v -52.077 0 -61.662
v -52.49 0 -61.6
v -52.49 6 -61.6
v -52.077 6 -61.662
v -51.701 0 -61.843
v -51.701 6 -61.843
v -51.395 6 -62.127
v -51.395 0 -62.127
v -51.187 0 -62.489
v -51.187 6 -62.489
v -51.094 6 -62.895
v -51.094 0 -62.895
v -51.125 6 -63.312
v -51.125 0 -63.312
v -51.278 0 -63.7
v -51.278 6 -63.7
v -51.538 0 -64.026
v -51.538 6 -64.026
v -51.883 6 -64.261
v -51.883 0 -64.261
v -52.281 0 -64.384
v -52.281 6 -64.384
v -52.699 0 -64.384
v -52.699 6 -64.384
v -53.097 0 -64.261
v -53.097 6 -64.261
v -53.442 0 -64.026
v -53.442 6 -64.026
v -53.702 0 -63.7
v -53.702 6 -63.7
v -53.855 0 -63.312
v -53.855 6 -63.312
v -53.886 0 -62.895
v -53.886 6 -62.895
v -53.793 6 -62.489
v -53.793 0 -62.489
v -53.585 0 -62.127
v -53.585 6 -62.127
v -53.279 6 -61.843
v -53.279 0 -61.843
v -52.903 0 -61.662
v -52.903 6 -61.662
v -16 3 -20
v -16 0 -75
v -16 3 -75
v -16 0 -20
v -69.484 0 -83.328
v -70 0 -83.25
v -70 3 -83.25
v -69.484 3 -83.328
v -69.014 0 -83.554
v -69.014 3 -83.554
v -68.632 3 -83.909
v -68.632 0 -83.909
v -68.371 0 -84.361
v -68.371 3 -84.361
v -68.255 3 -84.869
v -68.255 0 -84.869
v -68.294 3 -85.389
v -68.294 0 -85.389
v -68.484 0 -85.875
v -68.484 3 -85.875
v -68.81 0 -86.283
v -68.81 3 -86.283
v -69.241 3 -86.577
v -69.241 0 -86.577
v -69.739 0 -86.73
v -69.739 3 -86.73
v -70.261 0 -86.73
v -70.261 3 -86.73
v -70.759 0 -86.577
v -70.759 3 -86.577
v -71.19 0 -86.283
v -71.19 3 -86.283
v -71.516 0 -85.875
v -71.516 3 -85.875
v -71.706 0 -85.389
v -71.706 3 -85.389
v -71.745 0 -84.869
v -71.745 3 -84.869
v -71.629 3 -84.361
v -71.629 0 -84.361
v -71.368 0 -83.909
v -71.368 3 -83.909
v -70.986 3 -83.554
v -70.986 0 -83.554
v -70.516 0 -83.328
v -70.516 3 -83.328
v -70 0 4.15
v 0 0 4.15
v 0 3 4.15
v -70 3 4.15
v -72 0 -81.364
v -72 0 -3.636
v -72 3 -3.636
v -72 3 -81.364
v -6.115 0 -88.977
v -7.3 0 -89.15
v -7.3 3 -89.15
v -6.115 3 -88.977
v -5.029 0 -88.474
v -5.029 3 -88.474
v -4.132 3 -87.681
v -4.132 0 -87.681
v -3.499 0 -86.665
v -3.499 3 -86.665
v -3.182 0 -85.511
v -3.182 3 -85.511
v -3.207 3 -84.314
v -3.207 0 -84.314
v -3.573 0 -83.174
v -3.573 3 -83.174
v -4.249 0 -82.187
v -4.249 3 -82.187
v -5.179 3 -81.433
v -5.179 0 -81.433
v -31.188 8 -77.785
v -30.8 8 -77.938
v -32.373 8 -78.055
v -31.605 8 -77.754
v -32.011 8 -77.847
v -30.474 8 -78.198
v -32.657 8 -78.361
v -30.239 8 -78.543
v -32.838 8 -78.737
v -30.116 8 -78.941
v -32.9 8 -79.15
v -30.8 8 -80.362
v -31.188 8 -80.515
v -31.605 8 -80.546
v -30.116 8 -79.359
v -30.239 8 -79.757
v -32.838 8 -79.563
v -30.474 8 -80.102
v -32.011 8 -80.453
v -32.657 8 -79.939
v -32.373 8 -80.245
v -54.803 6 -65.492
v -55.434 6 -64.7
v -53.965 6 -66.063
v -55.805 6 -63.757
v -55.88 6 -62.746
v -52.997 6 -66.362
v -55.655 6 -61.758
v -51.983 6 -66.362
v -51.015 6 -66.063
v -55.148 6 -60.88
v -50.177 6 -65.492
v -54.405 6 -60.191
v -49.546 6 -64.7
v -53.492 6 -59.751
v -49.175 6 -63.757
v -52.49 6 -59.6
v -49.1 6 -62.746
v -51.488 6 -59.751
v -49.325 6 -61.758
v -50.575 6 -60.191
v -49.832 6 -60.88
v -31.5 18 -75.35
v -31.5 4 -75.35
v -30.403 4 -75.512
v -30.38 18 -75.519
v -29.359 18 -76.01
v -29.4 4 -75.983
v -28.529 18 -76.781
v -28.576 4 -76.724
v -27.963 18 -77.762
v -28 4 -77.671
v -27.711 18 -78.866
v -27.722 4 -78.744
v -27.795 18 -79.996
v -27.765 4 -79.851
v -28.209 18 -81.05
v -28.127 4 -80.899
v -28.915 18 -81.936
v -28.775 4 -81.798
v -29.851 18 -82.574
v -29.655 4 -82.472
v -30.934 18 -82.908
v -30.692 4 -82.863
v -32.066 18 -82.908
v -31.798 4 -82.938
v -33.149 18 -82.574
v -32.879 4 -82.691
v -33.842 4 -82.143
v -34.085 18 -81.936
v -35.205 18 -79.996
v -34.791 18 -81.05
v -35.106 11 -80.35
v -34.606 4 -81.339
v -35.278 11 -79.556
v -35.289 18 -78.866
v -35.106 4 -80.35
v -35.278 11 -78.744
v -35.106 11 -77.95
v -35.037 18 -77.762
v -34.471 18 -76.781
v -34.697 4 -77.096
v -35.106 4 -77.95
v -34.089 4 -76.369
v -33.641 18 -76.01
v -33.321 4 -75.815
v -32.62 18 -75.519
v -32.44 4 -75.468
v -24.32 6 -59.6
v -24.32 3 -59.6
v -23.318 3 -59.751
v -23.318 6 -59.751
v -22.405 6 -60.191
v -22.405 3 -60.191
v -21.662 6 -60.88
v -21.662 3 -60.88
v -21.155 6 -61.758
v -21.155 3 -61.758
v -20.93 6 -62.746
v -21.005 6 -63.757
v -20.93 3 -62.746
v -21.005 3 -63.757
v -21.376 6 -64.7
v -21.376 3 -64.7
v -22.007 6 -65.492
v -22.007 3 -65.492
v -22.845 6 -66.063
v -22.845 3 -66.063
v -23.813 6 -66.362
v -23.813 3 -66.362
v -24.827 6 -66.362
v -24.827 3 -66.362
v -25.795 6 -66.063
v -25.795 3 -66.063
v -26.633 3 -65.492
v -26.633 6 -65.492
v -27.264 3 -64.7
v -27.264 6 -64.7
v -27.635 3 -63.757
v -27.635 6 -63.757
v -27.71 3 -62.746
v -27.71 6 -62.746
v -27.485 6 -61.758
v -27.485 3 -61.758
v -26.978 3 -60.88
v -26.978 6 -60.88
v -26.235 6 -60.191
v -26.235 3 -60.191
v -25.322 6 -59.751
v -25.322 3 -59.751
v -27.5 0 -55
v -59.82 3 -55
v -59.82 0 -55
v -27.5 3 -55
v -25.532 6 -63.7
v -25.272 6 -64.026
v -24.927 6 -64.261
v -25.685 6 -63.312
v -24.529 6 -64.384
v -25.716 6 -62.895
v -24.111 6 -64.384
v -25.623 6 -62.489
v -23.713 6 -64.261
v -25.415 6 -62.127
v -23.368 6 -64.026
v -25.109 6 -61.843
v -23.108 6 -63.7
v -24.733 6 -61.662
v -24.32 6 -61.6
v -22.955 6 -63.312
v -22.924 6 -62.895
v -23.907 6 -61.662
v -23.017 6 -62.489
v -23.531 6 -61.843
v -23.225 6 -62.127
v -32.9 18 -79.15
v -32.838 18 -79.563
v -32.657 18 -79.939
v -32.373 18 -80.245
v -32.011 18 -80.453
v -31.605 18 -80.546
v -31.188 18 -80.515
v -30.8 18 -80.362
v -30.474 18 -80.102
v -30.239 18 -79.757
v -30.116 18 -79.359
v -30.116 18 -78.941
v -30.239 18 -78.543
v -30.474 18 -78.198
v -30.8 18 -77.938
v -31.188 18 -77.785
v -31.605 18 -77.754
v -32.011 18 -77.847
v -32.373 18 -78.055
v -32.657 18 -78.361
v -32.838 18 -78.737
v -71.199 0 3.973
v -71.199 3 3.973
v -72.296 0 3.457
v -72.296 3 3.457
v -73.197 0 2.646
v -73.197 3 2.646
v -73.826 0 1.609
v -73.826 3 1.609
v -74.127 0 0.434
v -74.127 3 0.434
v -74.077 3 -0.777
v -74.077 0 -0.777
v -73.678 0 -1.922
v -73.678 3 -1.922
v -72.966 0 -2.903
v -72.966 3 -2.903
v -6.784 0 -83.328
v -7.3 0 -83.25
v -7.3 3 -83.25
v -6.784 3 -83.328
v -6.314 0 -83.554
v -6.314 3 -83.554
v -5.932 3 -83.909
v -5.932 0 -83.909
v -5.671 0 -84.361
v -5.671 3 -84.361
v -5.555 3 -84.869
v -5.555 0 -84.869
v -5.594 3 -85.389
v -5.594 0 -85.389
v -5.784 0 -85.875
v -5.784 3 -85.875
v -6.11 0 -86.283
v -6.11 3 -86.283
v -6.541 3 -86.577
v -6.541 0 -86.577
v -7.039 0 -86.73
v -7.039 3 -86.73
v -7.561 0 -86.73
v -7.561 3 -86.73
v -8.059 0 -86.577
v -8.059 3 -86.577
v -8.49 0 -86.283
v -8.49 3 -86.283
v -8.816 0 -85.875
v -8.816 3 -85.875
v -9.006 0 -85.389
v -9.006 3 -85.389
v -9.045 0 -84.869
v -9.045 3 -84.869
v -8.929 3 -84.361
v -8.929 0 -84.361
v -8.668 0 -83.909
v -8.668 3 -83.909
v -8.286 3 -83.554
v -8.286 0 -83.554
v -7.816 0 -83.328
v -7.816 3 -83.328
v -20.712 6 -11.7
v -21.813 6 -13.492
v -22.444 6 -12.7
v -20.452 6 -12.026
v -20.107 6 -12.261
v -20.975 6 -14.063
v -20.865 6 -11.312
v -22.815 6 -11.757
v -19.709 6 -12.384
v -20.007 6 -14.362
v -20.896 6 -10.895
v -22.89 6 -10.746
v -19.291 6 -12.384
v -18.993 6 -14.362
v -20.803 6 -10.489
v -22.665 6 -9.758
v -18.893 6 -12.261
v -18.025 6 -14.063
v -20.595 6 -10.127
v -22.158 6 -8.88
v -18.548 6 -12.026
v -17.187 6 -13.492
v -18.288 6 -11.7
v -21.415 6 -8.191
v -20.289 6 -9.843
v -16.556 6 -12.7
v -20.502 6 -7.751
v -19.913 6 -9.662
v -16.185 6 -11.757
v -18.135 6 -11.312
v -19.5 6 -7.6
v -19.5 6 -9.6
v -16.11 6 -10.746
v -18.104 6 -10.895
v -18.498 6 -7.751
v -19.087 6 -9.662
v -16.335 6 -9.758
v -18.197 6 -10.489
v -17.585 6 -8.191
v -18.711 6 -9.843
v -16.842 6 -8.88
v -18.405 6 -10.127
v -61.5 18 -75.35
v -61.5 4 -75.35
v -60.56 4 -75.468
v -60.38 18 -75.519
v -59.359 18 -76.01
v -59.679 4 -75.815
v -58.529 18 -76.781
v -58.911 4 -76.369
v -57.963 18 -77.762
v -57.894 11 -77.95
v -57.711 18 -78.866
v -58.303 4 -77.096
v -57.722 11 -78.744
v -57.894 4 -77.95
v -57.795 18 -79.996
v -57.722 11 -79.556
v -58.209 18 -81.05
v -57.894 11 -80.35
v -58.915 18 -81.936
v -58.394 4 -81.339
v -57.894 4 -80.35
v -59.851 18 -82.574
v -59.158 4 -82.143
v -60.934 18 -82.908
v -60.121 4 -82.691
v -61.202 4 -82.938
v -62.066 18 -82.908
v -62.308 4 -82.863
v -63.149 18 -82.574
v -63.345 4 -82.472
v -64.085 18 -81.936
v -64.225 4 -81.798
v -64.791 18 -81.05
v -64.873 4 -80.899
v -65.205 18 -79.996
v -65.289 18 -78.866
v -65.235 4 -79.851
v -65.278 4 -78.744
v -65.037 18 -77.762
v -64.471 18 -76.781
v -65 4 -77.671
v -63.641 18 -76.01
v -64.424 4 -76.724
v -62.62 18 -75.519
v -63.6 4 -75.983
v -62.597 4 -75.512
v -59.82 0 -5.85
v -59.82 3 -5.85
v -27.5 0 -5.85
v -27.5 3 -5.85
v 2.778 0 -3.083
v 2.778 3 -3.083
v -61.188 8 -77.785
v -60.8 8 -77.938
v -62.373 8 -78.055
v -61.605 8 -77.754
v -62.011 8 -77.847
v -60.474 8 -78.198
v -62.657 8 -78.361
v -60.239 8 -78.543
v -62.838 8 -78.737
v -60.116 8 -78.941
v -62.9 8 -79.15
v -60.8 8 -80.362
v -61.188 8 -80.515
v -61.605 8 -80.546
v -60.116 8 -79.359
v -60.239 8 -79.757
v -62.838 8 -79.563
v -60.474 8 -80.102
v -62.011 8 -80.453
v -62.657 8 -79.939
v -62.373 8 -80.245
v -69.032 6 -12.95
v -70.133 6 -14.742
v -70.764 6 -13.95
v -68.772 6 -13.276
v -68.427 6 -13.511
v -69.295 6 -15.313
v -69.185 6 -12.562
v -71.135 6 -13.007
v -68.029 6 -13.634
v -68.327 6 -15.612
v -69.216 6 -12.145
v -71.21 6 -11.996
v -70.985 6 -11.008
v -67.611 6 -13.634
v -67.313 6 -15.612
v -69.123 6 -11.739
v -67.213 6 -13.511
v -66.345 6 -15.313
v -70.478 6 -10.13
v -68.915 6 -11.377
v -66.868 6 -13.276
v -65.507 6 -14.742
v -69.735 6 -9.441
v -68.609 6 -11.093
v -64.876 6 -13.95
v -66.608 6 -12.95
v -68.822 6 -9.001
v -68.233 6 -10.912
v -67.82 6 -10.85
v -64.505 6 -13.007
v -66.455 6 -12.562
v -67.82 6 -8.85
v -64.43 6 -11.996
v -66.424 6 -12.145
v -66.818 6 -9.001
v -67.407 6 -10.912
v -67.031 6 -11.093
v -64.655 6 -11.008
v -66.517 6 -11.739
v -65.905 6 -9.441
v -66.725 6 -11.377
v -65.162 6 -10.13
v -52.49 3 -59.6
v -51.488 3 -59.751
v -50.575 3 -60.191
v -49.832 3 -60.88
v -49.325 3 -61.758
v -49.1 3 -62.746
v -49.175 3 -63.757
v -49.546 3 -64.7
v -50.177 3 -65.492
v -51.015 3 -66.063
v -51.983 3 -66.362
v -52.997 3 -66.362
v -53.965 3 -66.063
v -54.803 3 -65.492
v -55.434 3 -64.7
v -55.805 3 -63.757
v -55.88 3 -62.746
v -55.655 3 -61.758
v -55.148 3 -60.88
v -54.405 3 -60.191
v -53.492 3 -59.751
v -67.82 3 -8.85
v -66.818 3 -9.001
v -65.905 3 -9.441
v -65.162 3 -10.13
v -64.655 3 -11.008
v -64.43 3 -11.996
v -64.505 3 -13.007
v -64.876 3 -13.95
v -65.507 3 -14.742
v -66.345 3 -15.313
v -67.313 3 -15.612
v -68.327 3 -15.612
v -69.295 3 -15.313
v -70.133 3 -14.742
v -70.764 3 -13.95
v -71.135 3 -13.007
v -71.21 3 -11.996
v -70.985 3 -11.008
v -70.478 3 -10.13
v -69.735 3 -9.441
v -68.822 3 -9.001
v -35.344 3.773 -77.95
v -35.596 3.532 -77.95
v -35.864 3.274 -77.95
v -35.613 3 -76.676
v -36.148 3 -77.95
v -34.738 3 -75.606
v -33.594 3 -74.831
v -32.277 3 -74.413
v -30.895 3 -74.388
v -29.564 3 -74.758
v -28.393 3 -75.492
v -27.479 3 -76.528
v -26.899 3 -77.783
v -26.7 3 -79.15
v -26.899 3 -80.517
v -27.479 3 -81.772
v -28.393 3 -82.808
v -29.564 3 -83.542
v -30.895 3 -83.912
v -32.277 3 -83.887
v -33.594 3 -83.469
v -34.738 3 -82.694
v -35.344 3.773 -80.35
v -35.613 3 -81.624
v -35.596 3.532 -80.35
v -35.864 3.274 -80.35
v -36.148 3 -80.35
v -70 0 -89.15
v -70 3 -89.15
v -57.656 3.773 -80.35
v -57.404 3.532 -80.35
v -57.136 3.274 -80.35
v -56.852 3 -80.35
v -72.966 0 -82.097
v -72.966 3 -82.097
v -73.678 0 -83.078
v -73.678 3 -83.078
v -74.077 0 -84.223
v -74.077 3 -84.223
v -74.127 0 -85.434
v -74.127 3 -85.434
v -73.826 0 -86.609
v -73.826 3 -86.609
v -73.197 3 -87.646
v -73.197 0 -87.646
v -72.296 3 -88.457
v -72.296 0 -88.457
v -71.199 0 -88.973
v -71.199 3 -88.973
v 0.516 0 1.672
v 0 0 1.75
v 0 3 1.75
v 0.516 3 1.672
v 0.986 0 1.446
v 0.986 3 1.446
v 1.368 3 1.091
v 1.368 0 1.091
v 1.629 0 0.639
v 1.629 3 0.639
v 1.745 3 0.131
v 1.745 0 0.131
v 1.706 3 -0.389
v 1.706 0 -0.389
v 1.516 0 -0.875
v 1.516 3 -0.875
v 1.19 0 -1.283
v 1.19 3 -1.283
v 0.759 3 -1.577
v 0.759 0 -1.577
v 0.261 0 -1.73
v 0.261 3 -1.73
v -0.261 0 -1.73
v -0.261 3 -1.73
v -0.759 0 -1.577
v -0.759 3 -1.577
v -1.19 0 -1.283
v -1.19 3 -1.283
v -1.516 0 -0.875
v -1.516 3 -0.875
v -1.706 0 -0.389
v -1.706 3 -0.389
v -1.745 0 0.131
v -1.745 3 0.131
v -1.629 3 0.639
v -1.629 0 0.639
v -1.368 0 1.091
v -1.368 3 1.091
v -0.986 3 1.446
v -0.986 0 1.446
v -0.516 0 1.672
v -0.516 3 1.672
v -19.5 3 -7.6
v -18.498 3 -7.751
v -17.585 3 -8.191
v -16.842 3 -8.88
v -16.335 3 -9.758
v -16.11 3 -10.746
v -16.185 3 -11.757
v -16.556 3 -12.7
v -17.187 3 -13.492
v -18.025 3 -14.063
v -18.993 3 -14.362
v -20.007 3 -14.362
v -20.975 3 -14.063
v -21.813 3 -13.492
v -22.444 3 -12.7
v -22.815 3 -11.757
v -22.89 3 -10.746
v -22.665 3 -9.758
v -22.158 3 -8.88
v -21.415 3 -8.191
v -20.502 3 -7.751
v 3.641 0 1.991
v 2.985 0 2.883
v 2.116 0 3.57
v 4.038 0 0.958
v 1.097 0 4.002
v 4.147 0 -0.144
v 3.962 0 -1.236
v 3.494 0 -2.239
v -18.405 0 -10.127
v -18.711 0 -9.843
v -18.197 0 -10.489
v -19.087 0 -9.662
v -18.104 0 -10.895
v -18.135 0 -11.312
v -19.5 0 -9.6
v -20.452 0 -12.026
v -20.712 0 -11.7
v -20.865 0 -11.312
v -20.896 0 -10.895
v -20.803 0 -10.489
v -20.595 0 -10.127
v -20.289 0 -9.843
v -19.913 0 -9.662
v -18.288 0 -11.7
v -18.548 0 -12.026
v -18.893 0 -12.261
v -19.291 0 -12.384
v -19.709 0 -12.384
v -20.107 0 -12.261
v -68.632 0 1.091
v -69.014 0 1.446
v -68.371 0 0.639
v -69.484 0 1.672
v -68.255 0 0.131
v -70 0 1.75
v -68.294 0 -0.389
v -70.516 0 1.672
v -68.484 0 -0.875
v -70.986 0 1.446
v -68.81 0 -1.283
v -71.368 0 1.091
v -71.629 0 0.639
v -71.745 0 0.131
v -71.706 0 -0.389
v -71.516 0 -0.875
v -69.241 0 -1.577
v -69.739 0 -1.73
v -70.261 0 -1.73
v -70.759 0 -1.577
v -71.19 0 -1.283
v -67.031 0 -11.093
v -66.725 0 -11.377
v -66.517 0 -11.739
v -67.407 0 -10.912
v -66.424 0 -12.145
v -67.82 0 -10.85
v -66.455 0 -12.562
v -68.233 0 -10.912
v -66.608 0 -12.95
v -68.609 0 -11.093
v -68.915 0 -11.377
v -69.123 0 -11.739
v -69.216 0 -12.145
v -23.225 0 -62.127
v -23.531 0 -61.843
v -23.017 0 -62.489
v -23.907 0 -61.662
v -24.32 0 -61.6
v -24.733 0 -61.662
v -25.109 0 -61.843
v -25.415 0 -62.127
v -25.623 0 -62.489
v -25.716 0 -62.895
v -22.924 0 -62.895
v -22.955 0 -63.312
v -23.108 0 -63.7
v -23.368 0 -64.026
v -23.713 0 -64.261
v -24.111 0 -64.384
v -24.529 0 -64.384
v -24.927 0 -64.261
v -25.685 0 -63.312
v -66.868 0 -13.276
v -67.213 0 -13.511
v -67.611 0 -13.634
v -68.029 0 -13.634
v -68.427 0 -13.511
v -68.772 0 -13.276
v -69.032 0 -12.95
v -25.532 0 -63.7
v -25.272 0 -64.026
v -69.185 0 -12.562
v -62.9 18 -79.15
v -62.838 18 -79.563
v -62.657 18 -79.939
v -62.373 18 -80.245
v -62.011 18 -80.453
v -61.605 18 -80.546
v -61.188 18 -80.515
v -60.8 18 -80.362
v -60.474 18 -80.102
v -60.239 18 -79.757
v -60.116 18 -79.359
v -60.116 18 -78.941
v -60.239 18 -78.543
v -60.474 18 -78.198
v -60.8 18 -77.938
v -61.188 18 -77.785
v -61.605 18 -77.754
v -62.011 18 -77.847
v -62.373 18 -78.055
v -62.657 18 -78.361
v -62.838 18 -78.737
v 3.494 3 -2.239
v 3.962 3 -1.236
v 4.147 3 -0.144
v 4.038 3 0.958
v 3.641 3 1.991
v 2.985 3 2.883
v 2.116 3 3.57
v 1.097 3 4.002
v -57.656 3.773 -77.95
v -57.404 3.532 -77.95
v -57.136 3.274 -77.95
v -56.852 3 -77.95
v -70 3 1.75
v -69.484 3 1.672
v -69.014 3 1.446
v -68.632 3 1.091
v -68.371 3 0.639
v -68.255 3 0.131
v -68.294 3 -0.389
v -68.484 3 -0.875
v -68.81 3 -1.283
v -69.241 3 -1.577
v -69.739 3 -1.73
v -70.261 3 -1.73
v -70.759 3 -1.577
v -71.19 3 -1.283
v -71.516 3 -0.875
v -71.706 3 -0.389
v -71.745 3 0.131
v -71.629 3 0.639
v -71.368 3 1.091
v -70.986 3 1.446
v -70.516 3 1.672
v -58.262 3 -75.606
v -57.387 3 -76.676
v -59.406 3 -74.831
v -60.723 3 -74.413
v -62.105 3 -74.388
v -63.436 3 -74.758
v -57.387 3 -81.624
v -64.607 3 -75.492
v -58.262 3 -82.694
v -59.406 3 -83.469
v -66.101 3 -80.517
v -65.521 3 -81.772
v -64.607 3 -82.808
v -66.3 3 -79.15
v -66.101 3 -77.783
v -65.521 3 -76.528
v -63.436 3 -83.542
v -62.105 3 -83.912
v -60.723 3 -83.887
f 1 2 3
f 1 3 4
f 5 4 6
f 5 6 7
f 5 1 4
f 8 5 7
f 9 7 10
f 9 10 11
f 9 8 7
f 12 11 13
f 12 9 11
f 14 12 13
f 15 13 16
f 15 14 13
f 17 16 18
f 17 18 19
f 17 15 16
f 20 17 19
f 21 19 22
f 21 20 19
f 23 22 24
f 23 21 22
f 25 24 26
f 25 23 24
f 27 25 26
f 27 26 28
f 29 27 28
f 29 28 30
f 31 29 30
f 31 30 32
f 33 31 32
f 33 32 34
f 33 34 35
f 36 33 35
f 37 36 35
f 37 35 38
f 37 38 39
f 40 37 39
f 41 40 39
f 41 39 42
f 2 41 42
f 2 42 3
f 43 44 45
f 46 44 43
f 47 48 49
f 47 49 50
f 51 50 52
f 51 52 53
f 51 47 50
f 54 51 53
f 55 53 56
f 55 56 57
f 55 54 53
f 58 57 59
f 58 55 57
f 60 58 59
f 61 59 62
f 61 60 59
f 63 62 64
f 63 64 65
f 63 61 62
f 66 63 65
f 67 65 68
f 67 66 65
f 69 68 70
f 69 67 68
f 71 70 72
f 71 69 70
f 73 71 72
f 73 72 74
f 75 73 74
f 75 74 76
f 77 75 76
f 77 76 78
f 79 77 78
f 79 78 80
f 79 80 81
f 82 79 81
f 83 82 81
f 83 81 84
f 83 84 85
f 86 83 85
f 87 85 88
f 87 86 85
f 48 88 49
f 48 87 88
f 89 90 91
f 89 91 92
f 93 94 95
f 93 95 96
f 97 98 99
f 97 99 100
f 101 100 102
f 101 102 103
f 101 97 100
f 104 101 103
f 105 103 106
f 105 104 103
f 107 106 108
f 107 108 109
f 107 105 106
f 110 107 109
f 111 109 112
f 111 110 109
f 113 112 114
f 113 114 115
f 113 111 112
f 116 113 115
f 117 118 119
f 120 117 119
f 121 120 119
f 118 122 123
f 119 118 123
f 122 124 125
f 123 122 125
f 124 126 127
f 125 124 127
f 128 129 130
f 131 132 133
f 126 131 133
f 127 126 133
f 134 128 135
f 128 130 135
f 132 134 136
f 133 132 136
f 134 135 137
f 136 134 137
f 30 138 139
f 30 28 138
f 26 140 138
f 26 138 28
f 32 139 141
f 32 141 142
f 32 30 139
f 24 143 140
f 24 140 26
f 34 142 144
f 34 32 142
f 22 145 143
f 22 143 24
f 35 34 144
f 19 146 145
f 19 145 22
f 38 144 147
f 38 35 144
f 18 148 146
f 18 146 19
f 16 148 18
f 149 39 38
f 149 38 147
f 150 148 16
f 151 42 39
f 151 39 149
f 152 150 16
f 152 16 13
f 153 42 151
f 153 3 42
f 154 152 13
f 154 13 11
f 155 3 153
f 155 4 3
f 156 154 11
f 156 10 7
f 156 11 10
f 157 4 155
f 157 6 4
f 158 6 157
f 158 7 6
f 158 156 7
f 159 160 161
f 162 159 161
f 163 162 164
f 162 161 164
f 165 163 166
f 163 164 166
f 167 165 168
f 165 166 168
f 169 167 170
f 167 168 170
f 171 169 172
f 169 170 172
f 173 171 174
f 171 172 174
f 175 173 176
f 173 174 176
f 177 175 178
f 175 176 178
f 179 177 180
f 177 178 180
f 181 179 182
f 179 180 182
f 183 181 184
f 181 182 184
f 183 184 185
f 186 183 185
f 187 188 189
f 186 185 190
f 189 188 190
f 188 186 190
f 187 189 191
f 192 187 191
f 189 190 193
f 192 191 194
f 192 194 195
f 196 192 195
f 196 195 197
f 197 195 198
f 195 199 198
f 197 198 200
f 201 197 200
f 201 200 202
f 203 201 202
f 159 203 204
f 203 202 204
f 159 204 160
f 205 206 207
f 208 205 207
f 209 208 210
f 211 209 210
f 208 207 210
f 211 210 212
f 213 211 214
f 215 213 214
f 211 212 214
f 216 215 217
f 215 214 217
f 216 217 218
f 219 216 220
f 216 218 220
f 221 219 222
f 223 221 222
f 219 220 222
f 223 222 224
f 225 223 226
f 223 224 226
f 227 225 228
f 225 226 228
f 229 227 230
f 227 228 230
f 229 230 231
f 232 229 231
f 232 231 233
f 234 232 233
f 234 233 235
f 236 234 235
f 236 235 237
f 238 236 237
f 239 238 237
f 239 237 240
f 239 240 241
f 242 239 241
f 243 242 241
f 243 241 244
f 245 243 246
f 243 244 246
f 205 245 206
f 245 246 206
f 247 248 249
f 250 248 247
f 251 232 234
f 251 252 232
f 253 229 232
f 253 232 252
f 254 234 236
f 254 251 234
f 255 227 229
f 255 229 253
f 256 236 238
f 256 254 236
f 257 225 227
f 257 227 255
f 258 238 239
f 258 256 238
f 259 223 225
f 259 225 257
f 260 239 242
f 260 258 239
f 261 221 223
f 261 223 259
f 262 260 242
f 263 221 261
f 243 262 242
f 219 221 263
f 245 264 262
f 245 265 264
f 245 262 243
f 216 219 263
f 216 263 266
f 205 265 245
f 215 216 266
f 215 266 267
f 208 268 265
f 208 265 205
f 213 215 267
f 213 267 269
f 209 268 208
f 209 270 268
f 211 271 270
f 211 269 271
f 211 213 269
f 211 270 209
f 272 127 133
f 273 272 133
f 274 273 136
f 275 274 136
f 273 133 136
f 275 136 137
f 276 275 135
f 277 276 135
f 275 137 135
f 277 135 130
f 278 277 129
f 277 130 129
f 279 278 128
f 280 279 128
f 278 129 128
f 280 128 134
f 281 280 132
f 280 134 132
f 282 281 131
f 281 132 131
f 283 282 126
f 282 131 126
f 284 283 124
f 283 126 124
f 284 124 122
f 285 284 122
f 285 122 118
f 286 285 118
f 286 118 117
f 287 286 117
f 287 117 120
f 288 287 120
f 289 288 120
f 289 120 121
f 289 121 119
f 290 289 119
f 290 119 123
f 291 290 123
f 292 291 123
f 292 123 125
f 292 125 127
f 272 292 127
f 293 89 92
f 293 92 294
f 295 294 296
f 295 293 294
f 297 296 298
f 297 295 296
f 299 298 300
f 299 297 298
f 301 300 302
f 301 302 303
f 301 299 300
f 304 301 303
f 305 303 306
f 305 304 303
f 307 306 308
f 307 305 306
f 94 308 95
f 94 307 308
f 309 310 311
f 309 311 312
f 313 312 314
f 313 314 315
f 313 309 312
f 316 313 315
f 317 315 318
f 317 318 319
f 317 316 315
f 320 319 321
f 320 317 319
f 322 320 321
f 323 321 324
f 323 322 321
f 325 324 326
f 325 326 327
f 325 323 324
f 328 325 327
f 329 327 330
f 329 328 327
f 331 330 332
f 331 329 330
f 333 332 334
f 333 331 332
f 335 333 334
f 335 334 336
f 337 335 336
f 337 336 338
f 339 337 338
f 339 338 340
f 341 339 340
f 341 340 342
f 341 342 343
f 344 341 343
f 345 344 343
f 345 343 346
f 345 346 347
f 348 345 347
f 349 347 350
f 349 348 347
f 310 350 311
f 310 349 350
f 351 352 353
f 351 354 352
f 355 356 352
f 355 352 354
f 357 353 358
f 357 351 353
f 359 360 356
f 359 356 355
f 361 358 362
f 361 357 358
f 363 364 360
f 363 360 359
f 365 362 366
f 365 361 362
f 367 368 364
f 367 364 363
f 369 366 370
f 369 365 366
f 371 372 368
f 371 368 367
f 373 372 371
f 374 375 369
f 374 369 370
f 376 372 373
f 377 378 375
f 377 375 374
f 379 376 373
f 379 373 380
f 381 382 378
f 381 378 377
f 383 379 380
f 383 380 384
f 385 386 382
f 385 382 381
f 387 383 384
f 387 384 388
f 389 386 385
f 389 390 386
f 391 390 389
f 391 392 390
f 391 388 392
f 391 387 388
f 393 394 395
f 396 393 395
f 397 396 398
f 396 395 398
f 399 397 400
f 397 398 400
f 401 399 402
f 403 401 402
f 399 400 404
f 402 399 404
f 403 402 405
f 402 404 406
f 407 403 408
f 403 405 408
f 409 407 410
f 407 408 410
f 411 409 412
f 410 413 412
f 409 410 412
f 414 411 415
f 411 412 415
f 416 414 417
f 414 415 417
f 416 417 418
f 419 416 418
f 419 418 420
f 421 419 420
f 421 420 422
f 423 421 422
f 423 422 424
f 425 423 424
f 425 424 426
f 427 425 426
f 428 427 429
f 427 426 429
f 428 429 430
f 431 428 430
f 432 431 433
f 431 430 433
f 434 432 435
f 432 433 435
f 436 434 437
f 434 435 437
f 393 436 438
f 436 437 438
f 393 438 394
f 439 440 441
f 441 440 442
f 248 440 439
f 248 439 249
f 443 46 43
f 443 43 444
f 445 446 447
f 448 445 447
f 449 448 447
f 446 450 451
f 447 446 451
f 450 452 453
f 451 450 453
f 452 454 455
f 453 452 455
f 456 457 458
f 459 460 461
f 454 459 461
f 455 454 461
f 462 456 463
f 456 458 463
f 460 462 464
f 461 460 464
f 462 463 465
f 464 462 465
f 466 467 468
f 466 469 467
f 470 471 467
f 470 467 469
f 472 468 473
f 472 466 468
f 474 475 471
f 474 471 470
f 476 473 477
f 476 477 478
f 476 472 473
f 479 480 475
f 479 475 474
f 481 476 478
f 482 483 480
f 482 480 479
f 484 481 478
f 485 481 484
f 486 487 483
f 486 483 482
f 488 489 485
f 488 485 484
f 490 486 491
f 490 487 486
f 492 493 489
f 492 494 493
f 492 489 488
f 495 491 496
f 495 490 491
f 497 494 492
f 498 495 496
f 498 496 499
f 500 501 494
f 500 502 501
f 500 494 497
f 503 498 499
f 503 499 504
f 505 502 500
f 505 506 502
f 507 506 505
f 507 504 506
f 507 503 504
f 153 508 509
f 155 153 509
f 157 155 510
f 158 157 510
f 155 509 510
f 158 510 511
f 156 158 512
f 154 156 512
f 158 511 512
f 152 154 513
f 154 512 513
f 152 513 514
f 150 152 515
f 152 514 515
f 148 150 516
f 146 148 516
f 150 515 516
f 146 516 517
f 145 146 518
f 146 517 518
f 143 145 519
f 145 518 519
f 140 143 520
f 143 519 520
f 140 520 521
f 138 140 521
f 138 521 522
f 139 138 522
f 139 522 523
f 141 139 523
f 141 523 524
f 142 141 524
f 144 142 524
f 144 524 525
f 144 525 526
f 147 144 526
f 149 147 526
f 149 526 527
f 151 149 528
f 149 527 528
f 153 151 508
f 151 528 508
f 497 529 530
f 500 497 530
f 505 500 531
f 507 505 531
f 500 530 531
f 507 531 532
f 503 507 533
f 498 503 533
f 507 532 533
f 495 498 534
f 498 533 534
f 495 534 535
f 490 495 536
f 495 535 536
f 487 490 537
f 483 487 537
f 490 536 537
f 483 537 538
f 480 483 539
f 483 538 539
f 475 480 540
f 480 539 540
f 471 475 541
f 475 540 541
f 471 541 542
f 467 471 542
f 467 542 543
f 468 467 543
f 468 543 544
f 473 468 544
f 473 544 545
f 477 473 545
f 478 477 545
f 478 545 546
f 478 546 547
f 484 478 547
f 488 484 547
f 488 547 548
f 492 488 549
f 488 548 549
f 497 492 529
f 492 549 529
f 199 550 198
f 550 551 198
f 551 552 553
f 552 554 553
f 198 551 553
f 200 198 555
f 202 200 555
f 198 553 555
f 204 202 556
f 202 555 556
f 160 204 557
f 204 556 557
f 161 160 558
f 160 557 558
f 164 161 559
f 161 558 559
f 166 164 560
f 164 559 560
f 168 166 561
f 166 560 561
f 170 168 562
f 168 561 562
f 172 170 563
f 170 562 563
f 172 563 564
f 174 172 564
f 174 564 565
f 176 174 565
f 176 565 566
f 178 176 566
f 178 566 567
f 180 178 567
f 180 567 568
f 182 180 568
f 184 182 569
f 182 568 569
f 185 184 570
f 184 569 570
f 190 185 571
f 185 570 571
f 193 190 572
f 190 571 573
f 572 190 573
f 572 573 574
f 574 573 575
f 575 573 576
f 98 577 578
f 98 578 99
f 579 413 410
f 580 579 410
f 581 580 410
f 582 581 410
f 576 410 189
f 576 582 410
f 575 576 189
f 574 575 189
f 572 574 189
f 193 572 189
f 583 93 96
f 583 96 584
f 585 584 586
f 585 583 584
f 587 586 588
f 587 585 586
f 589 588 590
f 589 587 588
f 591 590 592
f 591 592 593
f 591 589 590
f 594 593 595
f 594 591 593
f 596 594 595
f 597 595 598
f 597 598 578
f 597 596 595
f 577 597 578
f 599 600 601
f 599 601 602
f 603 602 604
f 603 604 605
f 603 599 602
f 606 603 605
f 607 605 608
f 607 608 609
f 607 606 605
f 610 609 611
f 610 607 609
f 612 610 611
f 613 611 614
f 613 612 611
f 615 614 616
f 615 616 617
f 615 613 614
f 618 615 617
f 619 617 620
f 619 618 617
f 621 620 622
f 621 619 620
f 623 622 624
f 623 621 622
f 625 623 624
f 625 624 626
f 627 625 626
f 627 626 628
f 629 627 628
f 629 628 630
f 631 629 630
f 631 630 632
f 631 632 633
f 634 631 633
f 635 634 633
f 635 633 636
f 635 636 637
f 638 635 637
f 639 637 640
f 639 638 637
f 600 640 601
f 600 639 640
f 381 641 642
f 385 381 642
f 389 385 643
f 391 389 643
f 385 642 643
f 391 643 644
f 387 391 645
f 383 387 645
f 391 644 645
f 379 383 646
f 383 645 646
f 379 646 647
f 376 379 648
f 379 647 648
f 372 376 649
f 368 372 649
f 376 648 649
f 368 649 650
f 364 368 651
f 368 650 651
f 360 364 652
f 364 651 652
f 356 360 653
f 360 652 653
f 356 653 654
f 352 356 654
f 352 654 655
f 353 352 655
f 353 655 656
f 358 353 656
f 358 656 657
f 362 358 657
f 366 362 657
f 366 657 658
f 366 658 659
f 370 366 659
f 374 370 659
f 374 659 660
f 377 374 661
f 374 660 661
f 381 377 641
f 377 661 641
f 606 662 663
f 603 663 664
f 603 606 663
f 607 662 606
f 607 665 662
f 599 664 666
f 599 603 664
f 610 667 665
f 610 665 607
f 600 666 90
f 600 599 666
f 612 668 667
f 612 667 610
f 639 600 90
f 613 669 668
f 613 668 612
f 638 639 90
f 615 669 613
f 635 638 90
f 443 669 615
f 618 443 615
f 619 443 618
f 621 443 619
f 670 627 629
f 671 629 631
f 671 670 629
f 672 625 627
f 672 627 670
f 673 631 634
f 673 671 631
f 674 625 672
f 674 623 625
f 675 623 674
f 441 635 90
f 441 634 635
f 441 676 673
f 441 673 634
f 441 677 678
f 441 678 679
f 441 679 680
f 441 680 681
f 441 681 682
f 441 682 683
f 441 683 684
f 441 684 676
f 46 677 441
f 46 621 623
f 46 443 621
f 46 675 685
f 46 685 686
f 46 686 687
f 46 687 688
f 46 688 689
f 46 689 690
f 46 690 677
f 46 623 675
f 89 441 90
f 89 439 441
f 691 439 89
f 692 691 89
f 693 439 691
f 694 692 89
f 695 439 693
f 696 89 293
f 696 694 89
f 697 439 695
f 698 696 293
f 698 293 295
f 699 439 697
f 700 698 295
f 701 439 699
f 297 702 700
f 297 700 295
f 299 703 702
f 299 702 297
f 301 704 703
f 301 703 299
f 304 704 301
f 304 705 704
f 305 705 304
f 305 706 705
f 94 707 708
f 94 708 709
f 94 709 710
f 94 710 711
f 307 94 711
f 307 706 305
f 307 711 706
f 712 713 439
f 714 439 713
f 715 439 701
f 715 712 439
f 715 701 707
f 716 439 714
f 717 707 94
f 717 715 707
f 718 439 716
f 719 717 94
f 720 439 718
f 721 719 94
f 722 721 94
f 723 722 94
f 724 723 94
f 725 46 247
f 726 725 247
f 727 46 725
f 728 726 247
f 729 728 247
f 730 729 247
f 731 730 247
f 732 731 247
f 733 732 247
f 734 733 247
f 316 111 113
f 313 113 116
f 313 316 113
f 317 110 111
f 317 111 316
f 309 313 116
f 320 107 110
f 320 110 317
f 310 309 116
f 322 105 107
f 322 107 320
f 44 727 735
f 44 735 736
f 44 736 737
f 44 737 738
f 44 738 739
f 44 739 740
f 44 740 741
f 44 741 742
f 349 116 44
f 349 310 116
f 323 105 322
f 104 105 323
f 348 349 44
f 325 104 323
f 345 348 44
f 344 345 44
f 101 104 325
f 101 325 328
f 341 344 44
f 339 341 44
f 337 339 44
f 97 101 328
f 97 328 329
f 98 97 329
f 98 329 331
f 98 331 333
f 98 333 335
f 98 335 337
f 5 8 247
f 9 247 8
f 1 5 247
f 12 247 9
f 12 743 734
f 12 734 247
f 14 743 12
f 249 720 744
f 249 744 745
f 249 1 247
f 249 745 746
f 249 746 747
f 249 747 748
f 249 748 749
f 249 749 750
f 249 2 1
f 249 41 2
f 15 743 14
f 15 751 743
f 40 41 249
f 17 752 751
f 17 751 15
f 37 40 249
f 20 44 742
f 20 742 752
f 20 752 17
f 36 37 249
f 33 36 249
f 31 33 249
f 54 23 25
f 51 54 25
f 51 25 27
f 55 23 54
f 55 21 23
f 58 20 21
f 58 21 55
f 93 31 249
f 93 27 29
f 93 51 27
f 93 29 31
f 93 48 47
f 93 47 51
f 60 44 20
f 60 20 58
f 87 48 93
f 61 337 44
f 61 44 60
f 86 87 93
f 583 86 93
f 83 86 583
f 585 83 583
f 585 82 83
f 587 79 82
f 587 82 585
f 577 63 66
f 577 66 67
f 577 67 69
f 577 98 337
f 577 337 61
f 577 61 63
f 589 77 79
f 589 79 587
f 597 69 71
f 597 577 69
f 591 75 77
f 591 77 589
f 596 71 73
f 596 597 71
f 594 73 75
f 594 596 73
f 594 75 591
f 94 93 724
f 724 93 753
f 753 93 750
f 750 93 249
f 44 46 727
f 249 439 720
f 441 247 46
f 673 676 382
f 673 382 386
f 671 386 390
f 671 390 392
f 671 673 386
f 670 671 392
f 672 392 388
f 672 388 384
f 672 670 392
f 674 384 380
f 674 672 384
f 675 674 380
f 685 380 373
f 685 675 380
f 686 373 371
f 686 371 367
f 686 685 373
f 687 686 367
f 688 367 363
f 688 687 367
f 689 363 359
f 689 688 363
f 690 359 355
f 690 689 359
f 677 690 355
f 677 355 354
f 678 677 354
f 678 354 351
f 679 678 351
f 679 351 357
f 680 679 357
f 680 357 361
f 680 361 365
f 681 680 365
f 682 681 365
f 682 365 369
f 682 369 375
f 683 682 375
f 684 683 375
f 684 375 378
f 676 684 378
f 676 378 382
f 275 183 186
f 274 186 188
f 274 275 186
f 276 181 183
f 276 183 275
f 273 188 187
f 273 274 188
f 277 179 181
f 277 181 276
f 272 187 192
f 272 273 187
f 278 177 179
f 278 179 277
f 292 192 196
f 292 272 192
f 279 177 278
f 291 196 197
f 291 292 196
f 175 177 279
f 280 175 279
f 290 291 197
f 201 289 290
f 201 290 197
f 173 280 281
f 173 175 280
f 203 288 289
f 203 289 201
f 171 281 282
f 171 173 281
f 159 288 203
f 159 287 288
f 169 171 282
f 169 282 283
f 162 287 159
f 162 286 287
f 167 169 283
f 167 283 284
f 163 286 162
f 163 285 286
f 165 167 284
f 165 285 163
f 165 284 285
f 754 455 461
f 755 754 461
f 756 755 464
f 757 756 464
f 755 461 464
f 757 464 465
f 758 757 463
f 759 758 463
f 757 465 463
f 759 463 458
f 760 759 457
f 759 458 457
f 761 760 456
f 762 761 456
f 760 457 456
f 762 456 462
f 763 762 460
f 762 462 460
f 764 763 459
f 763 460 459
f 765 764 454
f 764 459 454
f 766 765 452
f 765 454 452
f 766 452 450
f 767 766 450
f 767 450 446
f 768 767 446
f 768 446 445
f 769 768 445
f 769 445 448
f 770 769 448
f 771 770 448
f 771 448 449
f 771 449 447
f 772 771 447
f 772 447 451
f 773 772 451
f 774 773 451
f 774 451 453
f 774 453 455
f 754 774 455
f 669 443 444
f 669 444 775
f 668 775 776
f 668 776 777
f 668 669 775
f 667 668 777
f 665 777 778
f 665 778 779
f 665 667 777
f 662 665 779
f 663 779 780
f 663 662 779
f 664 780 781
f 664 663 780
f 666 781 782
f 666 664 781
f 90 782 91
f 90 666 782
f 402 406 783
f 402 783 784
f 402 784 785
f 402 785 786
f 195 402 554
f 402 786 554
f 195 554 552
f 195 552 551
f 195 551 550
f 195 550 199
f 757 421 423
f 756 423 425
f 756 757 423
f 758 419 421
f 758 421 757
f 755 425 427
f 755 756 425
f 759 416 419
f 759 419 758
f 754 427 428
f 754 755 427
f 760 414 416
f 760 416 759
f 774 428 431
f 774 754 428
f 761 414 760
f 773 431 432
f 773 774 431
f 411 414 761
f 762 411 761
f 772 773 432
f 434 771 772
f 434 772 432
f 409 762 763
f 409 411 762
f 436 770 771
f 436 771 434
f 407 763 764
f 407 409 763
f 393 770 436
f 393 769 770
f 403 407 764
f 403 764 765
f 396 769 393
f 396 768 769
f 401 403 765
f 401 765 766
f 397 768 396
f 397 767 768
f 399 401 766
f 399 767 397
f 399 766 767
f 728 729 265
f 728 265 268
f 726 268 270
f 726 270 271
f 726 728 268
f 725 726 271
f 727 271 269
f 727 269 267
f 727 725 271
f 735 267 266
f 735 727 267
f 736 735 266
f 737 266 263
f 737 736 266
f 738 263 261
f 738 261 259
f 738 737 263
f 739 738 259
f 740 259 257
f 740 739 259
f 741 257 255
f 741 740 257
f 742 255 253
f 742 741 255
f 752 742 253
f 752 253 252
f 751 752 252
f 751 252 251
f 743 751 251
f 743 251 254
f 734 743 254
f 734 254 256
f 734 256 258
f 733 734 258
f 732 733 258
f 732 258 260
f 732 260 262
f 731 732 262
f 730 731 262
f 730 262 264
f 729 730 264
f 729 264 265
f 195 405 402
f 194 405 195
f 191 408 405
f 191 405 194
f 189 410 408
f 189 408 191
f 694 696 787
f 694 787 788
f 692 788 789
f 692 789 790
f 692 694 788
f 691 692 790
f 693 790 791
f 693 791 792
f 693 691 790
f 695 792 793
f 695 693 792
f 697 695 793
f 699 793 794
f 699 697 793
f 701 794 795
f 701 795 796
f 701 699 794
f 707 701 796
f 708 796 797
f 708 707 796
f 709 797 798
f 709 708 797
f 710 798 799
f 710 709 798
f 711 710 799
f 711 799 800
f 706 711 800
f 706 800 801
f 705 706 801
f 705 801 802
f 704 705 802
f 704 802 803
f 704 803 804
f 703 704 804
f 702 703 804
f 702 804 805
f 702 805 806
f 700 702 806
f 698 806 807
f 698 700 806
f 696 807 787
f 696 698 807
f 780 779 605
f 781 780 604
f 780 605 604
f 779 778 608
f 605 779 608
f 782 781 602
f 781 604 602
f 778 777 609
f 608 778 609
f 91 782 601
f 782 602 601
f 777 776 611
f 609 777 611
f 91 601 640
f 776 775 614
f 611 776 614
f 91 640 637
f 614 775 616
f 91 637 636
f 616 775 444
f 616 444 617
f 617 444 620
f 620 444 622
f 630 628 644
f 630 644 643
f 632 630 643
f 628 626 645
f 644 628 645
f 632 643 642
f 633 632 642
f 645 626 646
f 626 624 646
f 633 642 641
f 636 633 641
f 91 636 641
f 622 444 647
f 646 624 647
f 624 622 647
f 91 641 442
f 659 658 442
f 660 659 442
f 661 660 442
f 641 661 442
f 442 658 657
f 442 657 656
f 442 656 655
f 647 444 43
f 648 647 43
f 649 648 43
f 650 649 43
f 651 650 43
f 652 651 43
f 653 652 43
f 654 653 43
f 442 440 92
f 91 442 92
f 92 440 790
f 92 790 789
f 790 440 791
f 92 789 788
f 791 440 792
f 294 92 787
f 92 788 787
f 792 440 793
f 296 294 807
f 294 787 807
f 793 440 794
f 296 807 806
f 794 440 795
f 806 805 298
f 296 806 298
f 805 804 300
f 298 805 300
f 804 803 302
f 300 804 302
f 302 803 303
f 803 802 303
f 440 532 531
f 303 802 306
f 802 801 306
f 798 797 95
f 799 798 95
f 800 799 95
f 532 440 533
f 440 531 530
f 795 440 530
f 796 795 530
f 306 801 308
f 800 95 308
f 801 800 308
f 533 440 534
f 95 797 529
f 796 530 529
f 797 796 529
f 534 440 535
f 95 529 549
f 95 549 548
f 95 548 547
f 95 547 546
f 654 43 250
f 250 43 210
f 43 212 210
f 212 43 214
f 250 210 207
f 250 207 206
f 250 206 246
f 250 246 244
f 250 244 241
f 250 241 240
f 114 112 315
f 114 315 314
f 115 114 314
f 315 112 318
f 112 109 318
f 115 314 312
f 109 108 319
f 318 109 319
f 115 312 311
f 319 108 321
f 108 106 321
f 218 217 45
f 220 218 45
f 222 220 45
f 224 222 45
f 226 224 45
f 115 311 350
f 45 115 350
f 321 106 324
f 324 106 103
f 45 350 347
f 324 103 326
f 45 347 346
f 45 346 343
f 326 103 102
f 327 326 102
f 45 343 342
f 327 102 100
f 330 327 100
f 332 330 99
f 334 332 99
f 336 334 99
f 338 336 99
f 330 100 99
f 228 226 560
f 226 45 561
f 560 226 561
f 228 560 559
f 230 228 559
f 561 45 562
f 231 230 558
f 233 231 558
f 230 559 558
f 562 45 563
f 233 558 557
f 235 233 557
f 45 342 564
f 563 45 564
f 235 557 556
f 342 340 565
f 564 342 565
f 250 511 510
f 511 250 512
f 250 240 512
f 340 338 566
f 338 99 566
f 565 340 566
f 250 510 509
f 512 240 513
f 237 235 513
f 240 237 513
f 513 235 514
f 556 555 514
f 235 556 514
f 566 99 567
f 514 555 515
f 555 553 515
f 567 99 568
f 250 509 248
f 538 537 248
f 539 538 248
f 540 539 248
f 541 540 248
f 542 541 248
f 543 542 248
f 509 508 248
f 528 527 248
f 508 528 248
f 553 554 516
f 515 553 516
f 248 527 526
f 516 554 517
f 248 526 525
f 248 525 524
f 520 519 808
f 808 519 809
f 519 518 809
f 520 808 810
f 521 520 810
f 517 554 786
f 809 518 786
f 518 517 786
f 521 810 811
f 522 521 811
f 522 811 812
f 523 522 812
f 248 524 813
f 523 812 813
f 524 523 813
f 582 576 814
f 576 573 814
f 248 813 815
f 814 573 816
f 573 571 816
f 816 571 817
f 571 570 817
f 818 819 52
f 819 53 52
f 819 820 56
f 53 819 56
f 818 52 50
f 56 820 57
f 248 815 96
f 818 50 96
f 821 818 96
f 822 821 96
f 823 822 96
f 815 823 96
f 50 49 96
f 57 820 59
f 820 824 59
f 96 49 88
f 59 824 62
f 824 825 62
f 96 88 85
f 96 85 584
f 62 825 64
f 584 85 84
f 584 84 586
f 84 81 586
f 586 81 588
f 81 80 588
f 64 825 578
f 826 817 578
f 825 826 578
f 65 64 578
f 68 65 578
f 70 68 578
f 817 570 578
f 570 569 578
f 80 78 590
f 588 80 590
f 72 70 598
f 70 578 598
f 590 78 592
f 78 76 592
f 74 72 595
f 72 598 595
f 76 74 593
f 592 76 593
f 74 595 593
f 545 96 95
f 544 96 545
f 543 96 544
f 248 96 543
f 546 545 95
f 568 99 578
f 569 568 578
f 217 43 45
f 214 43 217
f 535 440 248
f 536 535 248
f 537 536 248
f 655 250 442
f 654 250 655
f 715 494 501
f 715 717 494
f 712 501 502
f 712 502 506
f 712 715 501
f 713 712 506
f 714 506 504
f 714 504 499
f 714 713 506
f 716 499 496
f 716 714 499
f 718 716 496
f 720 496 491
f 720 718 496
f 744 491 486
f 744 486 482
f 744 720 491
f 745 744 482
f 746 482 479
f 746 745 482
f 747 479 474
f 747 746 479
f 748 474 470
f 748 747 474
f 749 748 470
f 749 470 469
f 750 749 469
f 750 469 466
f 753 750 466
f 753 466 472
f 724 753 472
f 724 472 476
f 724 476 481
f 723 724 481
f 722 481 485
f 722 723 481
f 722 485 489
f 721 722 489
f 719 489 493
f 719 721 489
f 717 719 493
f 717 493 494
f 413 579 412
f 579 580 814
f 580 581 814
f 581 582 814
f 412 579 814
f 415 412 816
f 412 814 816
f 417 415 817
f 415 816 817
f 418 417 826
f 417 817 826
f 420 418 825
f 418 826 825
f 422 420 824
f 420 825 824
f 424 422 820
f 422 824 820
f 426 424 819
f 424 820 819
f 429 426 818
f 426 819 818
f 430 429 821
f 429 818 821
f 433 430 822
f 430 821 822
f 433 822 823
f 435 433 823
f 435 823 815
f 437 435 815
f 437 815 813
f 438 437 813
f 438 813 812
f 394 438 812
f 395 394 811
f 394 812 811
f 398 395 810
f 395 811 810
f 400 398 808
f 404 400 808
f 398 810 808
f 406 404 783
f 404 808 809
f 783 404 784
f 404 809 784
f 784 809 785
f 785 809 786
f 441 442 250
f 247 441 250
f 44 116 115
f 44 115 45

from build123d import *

# Parameters (mm, degrees)
SCHIZZO1_R                   = 1.4
SCHIZZO1_R_2                 = 1.75
ESTRUSIONE_ESTRUSIONE1_DEPTH = 3
SCHIZZO2_R                   = 3.4
SCHIZZO2_R_2                 = 1.4
ESTRUSIONE_ESTRUSIONE2_DEPTH = 3
SCHIZZO3_R                   = 3.8
ESTRUSIONE_ESTRUSIONE3_DEPTH = 15
FORO_2_8_2_8_1_D             = 2.8
FORO_2_8_2_8_1_DEPTH         = 10
SCHIZZO6_W                   = 22.78889745
SCHIZZO6_H                   = 2.4
ESTRUSIONE_ESTRUSIONE4_DEPTH = 8
SMUSSO1_SIZE                 = 1
SCHIZZO8_W                   = 32.32
SCHIZZO8_H                   = 49.15
TAGLIO_ESTRUSIONE1_DEPTH     = 117.922816422


with BuildPart() as part:
    # Schizzo1 → Estrusione-Estrusione1 (new body)
    with BuildSketch(Plane(origin=(0, 0, 0), x_dir=(1, 0, 0), z_dir=(0, 1, 0))):
        with BuildLine():
            Line((-72, 3.636275567), (-72, 81.363724433))
            ThreePointArc((-72, 81.363724433), (-74.019517608, 86.032462202), (-70, 89.15))
            Line((-70, 89.15), (-7.3, 89.15))
            ThreePointArc((-7.3, 89.15), (-3.298340724, 86.09964678), (-5.179319645, 81.432758092))
            Line((-5.179319645, 81.432758092), (-16, 75))
            Line((-16, 75), (-16, 20))
            Line((-16, 20), (2.777722531, 3.083303025))
            ThreePointArc((2.777722531, 3.083303025), (3.87415846, -1.48774871), (0, -4.15))
            Line((0, -4.15), (-70, -4.15))
            ThreePointArc((-70, -4.15), (-74.019517608, -1.032462202), (-72, 3.636275567))
        make_face()
        with Locations(Location((-67.82, 12.25, 0), (0, 0, 270))):
            Circle(SCHIZZO1_R, mode=Mode.SUBTRACT)
        with Locations(Location((-19.5, 11, 0), (0, 0, 270))):
            Circle(SCHIZZO1_R, mode=Mode.SUBTRACT)
        with Locations(Location((-24.32, 63, 0), (0, 0, 270))):
            Circle(SCHIZZO1_R, mode=Mode.SUBTRACT)
        with Locations(Location((-52.49, 63, 0), (0, 0, 270))):
            Circle(SCHIZZO1_R, mode=Mode.SUBTRACT)
        with Locations(Location((0, 0, 0), (0, 0, 270))):
            Circle(SCHIZZO1_R_2, mode=Mode.SUBTRACT)
        with Locations(Location((-70, 0, 0), (0, 0, 270))):
            Circle(SCHIZZO1_R_2, mode=Mode.SUBTRACT)
        with Locations(Location((-70, 85, 0), (0, 0, 270))):
            Circle(SCHIZZO1_R_2, mode=Mode.SUBTRACT)
        with Locations(Location((-7.3, 85, 0), (0, 0, 270))):
            Circle(SCHIZZO1_R_2, mode=Mode.SUBTRACT)
    extrude(amount=ESTRUSIONE_ESTRUSIONE1_DEPTH)

    # Schizzo2 → Estrusione-Estrusione2 (add)
    # profile 1 of 4: a face of its own
    with BuildSketch(Plane(origin=(0, 3, 0), x_dir=(1, 0, 0), z_dir=(0, 1, 0))):
        with Locations(Location((-67.82, 12.25, 0), (0, 0, 270))):
            Circle(SCHIZZO2_R)
        with Locations(Location((-67.82, 12.25, 0), (0, 0, 270))):
            Circle(SCHIZZO2_R_2, mode=Mode.SUBTRACT)
    # profile 2 of 4: a face of its own
    with BuildSketch(Plane(origin=(0, 3, 0), x_dir=(1, 0, 0), z_dir=(0, 1, 0))):
        with Locations(Location((-19.5, 11, 0), (0, 0, 270))):
            Circle(SCHIZZO2_R)
        with Locations(Location((-19.5, 11, 0), (0, 0, 270))):
            Circle(SCHIZZO2_R_2, mode=Mode.SUBTRACT)
    # profile 3 of 4: a face of its own
    with BuildSketch(Plane(origin=(0, 3, 0), x_dir=(1, 0, 0), z_dir=(0, 1, 0))):
        with Locations(Location((-24.32, 63, 0), (0, 0, 270))):
            Circle(SCHIZZO2_R)
        with Locations(Location((-24.32, 63, 0), (0, 0, 270))):
            Circle(SCHIZZO2_R_2, mode=Mode.SUBTRACT)
    # profile 4 of 4: a face of its own
    with BuildSketch(Plane(origin=(0, 3, 0), x_dir=(1, 0, 0), z_dir=(0, 1, 0))):
        with Locations(Location((-52.49, 63, 0), (0, 0, 270))):
            Circle(SCHIZZO2_R)
        with Locations(Location((-52.49, 63, 0), (0, 0, 270))):
            Circle(SCHIZZO2_R_2, mode=Mode.SUBTRACT)
    extrude(amount=ESTRUSIONE_ESTRUSIONE2_DEPTH)

    # Schizzo3 → Estrusione-Estrusione3 (add)
    with BuildSketch(Plane(origin=(0, 3, 0), x_dir=(1, 0, 0), z_dir=(0, 1, 0))):
        with Locations(Location((-61.5, 79.15, 0), (0, 0, 270))):
            Circle(SCHIZZO3_R)
        with Locations(Location((-31.5, 79.15, 0), (0, 0, 270))):
            Circle(SCHIZZO3_R)
    extrude(amount=ESTRUSIONE_ESTRUSIONE3_DEPTH)

    # Foro Ø2.8 (2.8)-1
    with Locations(Plane(origin=(0, 18, 0), x_dir=(1, 0, 0), z_dir=(0, 1, 0))):
        with Locations((-61.5, 79.15), (-31.5, 79.15)):
            Hole(FORO_2_8_2_8_1_D / 2, depth=FORO_2_8_2_8_1_DEPTH)

    # Schizzo6 → Estrusione-Estrusione4 (add)
    with BuildSketch(Plane(origin=(0, 3, 0), x_dir=(1, 0, 0), z_dir=(0, 1, 0))):
        with Locations((-46.5, 79.15)):
            Rectangle(SCHIZZO6_W, SCHIZZO6_H)
    extrude(amount=ESTRUSIONE_ESTRUSIONE4_DEPTH)

    # Smusso1
    smusso1_edges = [part.edges().sort_by_distance(p)[0] for p in [
        (-28.417792999, 3, -81.372611077),
        (-64.582207001, 3, -81.372611077),
    ]]
    chamfer(smusso1_edges, length=SMUSSO1_SIZE)

    # Schizzo8 → Taglio-Estrusione1 (cut, through all)
    with BuildSketch(Plane(origin=(0, 3, 0), x_dir=(1, 0, 0), z_dir=(0, 1, 0))):
        with Locations((-43.66, 30.425)):
            Rectangle(SCHIZZO8_W, SCHIZZO8_H)
    extrude(amount=-TAGLIO_ESTRUSIONE1_DEPTH, mode=Mode.SUBTRACT)


solid = part.part
